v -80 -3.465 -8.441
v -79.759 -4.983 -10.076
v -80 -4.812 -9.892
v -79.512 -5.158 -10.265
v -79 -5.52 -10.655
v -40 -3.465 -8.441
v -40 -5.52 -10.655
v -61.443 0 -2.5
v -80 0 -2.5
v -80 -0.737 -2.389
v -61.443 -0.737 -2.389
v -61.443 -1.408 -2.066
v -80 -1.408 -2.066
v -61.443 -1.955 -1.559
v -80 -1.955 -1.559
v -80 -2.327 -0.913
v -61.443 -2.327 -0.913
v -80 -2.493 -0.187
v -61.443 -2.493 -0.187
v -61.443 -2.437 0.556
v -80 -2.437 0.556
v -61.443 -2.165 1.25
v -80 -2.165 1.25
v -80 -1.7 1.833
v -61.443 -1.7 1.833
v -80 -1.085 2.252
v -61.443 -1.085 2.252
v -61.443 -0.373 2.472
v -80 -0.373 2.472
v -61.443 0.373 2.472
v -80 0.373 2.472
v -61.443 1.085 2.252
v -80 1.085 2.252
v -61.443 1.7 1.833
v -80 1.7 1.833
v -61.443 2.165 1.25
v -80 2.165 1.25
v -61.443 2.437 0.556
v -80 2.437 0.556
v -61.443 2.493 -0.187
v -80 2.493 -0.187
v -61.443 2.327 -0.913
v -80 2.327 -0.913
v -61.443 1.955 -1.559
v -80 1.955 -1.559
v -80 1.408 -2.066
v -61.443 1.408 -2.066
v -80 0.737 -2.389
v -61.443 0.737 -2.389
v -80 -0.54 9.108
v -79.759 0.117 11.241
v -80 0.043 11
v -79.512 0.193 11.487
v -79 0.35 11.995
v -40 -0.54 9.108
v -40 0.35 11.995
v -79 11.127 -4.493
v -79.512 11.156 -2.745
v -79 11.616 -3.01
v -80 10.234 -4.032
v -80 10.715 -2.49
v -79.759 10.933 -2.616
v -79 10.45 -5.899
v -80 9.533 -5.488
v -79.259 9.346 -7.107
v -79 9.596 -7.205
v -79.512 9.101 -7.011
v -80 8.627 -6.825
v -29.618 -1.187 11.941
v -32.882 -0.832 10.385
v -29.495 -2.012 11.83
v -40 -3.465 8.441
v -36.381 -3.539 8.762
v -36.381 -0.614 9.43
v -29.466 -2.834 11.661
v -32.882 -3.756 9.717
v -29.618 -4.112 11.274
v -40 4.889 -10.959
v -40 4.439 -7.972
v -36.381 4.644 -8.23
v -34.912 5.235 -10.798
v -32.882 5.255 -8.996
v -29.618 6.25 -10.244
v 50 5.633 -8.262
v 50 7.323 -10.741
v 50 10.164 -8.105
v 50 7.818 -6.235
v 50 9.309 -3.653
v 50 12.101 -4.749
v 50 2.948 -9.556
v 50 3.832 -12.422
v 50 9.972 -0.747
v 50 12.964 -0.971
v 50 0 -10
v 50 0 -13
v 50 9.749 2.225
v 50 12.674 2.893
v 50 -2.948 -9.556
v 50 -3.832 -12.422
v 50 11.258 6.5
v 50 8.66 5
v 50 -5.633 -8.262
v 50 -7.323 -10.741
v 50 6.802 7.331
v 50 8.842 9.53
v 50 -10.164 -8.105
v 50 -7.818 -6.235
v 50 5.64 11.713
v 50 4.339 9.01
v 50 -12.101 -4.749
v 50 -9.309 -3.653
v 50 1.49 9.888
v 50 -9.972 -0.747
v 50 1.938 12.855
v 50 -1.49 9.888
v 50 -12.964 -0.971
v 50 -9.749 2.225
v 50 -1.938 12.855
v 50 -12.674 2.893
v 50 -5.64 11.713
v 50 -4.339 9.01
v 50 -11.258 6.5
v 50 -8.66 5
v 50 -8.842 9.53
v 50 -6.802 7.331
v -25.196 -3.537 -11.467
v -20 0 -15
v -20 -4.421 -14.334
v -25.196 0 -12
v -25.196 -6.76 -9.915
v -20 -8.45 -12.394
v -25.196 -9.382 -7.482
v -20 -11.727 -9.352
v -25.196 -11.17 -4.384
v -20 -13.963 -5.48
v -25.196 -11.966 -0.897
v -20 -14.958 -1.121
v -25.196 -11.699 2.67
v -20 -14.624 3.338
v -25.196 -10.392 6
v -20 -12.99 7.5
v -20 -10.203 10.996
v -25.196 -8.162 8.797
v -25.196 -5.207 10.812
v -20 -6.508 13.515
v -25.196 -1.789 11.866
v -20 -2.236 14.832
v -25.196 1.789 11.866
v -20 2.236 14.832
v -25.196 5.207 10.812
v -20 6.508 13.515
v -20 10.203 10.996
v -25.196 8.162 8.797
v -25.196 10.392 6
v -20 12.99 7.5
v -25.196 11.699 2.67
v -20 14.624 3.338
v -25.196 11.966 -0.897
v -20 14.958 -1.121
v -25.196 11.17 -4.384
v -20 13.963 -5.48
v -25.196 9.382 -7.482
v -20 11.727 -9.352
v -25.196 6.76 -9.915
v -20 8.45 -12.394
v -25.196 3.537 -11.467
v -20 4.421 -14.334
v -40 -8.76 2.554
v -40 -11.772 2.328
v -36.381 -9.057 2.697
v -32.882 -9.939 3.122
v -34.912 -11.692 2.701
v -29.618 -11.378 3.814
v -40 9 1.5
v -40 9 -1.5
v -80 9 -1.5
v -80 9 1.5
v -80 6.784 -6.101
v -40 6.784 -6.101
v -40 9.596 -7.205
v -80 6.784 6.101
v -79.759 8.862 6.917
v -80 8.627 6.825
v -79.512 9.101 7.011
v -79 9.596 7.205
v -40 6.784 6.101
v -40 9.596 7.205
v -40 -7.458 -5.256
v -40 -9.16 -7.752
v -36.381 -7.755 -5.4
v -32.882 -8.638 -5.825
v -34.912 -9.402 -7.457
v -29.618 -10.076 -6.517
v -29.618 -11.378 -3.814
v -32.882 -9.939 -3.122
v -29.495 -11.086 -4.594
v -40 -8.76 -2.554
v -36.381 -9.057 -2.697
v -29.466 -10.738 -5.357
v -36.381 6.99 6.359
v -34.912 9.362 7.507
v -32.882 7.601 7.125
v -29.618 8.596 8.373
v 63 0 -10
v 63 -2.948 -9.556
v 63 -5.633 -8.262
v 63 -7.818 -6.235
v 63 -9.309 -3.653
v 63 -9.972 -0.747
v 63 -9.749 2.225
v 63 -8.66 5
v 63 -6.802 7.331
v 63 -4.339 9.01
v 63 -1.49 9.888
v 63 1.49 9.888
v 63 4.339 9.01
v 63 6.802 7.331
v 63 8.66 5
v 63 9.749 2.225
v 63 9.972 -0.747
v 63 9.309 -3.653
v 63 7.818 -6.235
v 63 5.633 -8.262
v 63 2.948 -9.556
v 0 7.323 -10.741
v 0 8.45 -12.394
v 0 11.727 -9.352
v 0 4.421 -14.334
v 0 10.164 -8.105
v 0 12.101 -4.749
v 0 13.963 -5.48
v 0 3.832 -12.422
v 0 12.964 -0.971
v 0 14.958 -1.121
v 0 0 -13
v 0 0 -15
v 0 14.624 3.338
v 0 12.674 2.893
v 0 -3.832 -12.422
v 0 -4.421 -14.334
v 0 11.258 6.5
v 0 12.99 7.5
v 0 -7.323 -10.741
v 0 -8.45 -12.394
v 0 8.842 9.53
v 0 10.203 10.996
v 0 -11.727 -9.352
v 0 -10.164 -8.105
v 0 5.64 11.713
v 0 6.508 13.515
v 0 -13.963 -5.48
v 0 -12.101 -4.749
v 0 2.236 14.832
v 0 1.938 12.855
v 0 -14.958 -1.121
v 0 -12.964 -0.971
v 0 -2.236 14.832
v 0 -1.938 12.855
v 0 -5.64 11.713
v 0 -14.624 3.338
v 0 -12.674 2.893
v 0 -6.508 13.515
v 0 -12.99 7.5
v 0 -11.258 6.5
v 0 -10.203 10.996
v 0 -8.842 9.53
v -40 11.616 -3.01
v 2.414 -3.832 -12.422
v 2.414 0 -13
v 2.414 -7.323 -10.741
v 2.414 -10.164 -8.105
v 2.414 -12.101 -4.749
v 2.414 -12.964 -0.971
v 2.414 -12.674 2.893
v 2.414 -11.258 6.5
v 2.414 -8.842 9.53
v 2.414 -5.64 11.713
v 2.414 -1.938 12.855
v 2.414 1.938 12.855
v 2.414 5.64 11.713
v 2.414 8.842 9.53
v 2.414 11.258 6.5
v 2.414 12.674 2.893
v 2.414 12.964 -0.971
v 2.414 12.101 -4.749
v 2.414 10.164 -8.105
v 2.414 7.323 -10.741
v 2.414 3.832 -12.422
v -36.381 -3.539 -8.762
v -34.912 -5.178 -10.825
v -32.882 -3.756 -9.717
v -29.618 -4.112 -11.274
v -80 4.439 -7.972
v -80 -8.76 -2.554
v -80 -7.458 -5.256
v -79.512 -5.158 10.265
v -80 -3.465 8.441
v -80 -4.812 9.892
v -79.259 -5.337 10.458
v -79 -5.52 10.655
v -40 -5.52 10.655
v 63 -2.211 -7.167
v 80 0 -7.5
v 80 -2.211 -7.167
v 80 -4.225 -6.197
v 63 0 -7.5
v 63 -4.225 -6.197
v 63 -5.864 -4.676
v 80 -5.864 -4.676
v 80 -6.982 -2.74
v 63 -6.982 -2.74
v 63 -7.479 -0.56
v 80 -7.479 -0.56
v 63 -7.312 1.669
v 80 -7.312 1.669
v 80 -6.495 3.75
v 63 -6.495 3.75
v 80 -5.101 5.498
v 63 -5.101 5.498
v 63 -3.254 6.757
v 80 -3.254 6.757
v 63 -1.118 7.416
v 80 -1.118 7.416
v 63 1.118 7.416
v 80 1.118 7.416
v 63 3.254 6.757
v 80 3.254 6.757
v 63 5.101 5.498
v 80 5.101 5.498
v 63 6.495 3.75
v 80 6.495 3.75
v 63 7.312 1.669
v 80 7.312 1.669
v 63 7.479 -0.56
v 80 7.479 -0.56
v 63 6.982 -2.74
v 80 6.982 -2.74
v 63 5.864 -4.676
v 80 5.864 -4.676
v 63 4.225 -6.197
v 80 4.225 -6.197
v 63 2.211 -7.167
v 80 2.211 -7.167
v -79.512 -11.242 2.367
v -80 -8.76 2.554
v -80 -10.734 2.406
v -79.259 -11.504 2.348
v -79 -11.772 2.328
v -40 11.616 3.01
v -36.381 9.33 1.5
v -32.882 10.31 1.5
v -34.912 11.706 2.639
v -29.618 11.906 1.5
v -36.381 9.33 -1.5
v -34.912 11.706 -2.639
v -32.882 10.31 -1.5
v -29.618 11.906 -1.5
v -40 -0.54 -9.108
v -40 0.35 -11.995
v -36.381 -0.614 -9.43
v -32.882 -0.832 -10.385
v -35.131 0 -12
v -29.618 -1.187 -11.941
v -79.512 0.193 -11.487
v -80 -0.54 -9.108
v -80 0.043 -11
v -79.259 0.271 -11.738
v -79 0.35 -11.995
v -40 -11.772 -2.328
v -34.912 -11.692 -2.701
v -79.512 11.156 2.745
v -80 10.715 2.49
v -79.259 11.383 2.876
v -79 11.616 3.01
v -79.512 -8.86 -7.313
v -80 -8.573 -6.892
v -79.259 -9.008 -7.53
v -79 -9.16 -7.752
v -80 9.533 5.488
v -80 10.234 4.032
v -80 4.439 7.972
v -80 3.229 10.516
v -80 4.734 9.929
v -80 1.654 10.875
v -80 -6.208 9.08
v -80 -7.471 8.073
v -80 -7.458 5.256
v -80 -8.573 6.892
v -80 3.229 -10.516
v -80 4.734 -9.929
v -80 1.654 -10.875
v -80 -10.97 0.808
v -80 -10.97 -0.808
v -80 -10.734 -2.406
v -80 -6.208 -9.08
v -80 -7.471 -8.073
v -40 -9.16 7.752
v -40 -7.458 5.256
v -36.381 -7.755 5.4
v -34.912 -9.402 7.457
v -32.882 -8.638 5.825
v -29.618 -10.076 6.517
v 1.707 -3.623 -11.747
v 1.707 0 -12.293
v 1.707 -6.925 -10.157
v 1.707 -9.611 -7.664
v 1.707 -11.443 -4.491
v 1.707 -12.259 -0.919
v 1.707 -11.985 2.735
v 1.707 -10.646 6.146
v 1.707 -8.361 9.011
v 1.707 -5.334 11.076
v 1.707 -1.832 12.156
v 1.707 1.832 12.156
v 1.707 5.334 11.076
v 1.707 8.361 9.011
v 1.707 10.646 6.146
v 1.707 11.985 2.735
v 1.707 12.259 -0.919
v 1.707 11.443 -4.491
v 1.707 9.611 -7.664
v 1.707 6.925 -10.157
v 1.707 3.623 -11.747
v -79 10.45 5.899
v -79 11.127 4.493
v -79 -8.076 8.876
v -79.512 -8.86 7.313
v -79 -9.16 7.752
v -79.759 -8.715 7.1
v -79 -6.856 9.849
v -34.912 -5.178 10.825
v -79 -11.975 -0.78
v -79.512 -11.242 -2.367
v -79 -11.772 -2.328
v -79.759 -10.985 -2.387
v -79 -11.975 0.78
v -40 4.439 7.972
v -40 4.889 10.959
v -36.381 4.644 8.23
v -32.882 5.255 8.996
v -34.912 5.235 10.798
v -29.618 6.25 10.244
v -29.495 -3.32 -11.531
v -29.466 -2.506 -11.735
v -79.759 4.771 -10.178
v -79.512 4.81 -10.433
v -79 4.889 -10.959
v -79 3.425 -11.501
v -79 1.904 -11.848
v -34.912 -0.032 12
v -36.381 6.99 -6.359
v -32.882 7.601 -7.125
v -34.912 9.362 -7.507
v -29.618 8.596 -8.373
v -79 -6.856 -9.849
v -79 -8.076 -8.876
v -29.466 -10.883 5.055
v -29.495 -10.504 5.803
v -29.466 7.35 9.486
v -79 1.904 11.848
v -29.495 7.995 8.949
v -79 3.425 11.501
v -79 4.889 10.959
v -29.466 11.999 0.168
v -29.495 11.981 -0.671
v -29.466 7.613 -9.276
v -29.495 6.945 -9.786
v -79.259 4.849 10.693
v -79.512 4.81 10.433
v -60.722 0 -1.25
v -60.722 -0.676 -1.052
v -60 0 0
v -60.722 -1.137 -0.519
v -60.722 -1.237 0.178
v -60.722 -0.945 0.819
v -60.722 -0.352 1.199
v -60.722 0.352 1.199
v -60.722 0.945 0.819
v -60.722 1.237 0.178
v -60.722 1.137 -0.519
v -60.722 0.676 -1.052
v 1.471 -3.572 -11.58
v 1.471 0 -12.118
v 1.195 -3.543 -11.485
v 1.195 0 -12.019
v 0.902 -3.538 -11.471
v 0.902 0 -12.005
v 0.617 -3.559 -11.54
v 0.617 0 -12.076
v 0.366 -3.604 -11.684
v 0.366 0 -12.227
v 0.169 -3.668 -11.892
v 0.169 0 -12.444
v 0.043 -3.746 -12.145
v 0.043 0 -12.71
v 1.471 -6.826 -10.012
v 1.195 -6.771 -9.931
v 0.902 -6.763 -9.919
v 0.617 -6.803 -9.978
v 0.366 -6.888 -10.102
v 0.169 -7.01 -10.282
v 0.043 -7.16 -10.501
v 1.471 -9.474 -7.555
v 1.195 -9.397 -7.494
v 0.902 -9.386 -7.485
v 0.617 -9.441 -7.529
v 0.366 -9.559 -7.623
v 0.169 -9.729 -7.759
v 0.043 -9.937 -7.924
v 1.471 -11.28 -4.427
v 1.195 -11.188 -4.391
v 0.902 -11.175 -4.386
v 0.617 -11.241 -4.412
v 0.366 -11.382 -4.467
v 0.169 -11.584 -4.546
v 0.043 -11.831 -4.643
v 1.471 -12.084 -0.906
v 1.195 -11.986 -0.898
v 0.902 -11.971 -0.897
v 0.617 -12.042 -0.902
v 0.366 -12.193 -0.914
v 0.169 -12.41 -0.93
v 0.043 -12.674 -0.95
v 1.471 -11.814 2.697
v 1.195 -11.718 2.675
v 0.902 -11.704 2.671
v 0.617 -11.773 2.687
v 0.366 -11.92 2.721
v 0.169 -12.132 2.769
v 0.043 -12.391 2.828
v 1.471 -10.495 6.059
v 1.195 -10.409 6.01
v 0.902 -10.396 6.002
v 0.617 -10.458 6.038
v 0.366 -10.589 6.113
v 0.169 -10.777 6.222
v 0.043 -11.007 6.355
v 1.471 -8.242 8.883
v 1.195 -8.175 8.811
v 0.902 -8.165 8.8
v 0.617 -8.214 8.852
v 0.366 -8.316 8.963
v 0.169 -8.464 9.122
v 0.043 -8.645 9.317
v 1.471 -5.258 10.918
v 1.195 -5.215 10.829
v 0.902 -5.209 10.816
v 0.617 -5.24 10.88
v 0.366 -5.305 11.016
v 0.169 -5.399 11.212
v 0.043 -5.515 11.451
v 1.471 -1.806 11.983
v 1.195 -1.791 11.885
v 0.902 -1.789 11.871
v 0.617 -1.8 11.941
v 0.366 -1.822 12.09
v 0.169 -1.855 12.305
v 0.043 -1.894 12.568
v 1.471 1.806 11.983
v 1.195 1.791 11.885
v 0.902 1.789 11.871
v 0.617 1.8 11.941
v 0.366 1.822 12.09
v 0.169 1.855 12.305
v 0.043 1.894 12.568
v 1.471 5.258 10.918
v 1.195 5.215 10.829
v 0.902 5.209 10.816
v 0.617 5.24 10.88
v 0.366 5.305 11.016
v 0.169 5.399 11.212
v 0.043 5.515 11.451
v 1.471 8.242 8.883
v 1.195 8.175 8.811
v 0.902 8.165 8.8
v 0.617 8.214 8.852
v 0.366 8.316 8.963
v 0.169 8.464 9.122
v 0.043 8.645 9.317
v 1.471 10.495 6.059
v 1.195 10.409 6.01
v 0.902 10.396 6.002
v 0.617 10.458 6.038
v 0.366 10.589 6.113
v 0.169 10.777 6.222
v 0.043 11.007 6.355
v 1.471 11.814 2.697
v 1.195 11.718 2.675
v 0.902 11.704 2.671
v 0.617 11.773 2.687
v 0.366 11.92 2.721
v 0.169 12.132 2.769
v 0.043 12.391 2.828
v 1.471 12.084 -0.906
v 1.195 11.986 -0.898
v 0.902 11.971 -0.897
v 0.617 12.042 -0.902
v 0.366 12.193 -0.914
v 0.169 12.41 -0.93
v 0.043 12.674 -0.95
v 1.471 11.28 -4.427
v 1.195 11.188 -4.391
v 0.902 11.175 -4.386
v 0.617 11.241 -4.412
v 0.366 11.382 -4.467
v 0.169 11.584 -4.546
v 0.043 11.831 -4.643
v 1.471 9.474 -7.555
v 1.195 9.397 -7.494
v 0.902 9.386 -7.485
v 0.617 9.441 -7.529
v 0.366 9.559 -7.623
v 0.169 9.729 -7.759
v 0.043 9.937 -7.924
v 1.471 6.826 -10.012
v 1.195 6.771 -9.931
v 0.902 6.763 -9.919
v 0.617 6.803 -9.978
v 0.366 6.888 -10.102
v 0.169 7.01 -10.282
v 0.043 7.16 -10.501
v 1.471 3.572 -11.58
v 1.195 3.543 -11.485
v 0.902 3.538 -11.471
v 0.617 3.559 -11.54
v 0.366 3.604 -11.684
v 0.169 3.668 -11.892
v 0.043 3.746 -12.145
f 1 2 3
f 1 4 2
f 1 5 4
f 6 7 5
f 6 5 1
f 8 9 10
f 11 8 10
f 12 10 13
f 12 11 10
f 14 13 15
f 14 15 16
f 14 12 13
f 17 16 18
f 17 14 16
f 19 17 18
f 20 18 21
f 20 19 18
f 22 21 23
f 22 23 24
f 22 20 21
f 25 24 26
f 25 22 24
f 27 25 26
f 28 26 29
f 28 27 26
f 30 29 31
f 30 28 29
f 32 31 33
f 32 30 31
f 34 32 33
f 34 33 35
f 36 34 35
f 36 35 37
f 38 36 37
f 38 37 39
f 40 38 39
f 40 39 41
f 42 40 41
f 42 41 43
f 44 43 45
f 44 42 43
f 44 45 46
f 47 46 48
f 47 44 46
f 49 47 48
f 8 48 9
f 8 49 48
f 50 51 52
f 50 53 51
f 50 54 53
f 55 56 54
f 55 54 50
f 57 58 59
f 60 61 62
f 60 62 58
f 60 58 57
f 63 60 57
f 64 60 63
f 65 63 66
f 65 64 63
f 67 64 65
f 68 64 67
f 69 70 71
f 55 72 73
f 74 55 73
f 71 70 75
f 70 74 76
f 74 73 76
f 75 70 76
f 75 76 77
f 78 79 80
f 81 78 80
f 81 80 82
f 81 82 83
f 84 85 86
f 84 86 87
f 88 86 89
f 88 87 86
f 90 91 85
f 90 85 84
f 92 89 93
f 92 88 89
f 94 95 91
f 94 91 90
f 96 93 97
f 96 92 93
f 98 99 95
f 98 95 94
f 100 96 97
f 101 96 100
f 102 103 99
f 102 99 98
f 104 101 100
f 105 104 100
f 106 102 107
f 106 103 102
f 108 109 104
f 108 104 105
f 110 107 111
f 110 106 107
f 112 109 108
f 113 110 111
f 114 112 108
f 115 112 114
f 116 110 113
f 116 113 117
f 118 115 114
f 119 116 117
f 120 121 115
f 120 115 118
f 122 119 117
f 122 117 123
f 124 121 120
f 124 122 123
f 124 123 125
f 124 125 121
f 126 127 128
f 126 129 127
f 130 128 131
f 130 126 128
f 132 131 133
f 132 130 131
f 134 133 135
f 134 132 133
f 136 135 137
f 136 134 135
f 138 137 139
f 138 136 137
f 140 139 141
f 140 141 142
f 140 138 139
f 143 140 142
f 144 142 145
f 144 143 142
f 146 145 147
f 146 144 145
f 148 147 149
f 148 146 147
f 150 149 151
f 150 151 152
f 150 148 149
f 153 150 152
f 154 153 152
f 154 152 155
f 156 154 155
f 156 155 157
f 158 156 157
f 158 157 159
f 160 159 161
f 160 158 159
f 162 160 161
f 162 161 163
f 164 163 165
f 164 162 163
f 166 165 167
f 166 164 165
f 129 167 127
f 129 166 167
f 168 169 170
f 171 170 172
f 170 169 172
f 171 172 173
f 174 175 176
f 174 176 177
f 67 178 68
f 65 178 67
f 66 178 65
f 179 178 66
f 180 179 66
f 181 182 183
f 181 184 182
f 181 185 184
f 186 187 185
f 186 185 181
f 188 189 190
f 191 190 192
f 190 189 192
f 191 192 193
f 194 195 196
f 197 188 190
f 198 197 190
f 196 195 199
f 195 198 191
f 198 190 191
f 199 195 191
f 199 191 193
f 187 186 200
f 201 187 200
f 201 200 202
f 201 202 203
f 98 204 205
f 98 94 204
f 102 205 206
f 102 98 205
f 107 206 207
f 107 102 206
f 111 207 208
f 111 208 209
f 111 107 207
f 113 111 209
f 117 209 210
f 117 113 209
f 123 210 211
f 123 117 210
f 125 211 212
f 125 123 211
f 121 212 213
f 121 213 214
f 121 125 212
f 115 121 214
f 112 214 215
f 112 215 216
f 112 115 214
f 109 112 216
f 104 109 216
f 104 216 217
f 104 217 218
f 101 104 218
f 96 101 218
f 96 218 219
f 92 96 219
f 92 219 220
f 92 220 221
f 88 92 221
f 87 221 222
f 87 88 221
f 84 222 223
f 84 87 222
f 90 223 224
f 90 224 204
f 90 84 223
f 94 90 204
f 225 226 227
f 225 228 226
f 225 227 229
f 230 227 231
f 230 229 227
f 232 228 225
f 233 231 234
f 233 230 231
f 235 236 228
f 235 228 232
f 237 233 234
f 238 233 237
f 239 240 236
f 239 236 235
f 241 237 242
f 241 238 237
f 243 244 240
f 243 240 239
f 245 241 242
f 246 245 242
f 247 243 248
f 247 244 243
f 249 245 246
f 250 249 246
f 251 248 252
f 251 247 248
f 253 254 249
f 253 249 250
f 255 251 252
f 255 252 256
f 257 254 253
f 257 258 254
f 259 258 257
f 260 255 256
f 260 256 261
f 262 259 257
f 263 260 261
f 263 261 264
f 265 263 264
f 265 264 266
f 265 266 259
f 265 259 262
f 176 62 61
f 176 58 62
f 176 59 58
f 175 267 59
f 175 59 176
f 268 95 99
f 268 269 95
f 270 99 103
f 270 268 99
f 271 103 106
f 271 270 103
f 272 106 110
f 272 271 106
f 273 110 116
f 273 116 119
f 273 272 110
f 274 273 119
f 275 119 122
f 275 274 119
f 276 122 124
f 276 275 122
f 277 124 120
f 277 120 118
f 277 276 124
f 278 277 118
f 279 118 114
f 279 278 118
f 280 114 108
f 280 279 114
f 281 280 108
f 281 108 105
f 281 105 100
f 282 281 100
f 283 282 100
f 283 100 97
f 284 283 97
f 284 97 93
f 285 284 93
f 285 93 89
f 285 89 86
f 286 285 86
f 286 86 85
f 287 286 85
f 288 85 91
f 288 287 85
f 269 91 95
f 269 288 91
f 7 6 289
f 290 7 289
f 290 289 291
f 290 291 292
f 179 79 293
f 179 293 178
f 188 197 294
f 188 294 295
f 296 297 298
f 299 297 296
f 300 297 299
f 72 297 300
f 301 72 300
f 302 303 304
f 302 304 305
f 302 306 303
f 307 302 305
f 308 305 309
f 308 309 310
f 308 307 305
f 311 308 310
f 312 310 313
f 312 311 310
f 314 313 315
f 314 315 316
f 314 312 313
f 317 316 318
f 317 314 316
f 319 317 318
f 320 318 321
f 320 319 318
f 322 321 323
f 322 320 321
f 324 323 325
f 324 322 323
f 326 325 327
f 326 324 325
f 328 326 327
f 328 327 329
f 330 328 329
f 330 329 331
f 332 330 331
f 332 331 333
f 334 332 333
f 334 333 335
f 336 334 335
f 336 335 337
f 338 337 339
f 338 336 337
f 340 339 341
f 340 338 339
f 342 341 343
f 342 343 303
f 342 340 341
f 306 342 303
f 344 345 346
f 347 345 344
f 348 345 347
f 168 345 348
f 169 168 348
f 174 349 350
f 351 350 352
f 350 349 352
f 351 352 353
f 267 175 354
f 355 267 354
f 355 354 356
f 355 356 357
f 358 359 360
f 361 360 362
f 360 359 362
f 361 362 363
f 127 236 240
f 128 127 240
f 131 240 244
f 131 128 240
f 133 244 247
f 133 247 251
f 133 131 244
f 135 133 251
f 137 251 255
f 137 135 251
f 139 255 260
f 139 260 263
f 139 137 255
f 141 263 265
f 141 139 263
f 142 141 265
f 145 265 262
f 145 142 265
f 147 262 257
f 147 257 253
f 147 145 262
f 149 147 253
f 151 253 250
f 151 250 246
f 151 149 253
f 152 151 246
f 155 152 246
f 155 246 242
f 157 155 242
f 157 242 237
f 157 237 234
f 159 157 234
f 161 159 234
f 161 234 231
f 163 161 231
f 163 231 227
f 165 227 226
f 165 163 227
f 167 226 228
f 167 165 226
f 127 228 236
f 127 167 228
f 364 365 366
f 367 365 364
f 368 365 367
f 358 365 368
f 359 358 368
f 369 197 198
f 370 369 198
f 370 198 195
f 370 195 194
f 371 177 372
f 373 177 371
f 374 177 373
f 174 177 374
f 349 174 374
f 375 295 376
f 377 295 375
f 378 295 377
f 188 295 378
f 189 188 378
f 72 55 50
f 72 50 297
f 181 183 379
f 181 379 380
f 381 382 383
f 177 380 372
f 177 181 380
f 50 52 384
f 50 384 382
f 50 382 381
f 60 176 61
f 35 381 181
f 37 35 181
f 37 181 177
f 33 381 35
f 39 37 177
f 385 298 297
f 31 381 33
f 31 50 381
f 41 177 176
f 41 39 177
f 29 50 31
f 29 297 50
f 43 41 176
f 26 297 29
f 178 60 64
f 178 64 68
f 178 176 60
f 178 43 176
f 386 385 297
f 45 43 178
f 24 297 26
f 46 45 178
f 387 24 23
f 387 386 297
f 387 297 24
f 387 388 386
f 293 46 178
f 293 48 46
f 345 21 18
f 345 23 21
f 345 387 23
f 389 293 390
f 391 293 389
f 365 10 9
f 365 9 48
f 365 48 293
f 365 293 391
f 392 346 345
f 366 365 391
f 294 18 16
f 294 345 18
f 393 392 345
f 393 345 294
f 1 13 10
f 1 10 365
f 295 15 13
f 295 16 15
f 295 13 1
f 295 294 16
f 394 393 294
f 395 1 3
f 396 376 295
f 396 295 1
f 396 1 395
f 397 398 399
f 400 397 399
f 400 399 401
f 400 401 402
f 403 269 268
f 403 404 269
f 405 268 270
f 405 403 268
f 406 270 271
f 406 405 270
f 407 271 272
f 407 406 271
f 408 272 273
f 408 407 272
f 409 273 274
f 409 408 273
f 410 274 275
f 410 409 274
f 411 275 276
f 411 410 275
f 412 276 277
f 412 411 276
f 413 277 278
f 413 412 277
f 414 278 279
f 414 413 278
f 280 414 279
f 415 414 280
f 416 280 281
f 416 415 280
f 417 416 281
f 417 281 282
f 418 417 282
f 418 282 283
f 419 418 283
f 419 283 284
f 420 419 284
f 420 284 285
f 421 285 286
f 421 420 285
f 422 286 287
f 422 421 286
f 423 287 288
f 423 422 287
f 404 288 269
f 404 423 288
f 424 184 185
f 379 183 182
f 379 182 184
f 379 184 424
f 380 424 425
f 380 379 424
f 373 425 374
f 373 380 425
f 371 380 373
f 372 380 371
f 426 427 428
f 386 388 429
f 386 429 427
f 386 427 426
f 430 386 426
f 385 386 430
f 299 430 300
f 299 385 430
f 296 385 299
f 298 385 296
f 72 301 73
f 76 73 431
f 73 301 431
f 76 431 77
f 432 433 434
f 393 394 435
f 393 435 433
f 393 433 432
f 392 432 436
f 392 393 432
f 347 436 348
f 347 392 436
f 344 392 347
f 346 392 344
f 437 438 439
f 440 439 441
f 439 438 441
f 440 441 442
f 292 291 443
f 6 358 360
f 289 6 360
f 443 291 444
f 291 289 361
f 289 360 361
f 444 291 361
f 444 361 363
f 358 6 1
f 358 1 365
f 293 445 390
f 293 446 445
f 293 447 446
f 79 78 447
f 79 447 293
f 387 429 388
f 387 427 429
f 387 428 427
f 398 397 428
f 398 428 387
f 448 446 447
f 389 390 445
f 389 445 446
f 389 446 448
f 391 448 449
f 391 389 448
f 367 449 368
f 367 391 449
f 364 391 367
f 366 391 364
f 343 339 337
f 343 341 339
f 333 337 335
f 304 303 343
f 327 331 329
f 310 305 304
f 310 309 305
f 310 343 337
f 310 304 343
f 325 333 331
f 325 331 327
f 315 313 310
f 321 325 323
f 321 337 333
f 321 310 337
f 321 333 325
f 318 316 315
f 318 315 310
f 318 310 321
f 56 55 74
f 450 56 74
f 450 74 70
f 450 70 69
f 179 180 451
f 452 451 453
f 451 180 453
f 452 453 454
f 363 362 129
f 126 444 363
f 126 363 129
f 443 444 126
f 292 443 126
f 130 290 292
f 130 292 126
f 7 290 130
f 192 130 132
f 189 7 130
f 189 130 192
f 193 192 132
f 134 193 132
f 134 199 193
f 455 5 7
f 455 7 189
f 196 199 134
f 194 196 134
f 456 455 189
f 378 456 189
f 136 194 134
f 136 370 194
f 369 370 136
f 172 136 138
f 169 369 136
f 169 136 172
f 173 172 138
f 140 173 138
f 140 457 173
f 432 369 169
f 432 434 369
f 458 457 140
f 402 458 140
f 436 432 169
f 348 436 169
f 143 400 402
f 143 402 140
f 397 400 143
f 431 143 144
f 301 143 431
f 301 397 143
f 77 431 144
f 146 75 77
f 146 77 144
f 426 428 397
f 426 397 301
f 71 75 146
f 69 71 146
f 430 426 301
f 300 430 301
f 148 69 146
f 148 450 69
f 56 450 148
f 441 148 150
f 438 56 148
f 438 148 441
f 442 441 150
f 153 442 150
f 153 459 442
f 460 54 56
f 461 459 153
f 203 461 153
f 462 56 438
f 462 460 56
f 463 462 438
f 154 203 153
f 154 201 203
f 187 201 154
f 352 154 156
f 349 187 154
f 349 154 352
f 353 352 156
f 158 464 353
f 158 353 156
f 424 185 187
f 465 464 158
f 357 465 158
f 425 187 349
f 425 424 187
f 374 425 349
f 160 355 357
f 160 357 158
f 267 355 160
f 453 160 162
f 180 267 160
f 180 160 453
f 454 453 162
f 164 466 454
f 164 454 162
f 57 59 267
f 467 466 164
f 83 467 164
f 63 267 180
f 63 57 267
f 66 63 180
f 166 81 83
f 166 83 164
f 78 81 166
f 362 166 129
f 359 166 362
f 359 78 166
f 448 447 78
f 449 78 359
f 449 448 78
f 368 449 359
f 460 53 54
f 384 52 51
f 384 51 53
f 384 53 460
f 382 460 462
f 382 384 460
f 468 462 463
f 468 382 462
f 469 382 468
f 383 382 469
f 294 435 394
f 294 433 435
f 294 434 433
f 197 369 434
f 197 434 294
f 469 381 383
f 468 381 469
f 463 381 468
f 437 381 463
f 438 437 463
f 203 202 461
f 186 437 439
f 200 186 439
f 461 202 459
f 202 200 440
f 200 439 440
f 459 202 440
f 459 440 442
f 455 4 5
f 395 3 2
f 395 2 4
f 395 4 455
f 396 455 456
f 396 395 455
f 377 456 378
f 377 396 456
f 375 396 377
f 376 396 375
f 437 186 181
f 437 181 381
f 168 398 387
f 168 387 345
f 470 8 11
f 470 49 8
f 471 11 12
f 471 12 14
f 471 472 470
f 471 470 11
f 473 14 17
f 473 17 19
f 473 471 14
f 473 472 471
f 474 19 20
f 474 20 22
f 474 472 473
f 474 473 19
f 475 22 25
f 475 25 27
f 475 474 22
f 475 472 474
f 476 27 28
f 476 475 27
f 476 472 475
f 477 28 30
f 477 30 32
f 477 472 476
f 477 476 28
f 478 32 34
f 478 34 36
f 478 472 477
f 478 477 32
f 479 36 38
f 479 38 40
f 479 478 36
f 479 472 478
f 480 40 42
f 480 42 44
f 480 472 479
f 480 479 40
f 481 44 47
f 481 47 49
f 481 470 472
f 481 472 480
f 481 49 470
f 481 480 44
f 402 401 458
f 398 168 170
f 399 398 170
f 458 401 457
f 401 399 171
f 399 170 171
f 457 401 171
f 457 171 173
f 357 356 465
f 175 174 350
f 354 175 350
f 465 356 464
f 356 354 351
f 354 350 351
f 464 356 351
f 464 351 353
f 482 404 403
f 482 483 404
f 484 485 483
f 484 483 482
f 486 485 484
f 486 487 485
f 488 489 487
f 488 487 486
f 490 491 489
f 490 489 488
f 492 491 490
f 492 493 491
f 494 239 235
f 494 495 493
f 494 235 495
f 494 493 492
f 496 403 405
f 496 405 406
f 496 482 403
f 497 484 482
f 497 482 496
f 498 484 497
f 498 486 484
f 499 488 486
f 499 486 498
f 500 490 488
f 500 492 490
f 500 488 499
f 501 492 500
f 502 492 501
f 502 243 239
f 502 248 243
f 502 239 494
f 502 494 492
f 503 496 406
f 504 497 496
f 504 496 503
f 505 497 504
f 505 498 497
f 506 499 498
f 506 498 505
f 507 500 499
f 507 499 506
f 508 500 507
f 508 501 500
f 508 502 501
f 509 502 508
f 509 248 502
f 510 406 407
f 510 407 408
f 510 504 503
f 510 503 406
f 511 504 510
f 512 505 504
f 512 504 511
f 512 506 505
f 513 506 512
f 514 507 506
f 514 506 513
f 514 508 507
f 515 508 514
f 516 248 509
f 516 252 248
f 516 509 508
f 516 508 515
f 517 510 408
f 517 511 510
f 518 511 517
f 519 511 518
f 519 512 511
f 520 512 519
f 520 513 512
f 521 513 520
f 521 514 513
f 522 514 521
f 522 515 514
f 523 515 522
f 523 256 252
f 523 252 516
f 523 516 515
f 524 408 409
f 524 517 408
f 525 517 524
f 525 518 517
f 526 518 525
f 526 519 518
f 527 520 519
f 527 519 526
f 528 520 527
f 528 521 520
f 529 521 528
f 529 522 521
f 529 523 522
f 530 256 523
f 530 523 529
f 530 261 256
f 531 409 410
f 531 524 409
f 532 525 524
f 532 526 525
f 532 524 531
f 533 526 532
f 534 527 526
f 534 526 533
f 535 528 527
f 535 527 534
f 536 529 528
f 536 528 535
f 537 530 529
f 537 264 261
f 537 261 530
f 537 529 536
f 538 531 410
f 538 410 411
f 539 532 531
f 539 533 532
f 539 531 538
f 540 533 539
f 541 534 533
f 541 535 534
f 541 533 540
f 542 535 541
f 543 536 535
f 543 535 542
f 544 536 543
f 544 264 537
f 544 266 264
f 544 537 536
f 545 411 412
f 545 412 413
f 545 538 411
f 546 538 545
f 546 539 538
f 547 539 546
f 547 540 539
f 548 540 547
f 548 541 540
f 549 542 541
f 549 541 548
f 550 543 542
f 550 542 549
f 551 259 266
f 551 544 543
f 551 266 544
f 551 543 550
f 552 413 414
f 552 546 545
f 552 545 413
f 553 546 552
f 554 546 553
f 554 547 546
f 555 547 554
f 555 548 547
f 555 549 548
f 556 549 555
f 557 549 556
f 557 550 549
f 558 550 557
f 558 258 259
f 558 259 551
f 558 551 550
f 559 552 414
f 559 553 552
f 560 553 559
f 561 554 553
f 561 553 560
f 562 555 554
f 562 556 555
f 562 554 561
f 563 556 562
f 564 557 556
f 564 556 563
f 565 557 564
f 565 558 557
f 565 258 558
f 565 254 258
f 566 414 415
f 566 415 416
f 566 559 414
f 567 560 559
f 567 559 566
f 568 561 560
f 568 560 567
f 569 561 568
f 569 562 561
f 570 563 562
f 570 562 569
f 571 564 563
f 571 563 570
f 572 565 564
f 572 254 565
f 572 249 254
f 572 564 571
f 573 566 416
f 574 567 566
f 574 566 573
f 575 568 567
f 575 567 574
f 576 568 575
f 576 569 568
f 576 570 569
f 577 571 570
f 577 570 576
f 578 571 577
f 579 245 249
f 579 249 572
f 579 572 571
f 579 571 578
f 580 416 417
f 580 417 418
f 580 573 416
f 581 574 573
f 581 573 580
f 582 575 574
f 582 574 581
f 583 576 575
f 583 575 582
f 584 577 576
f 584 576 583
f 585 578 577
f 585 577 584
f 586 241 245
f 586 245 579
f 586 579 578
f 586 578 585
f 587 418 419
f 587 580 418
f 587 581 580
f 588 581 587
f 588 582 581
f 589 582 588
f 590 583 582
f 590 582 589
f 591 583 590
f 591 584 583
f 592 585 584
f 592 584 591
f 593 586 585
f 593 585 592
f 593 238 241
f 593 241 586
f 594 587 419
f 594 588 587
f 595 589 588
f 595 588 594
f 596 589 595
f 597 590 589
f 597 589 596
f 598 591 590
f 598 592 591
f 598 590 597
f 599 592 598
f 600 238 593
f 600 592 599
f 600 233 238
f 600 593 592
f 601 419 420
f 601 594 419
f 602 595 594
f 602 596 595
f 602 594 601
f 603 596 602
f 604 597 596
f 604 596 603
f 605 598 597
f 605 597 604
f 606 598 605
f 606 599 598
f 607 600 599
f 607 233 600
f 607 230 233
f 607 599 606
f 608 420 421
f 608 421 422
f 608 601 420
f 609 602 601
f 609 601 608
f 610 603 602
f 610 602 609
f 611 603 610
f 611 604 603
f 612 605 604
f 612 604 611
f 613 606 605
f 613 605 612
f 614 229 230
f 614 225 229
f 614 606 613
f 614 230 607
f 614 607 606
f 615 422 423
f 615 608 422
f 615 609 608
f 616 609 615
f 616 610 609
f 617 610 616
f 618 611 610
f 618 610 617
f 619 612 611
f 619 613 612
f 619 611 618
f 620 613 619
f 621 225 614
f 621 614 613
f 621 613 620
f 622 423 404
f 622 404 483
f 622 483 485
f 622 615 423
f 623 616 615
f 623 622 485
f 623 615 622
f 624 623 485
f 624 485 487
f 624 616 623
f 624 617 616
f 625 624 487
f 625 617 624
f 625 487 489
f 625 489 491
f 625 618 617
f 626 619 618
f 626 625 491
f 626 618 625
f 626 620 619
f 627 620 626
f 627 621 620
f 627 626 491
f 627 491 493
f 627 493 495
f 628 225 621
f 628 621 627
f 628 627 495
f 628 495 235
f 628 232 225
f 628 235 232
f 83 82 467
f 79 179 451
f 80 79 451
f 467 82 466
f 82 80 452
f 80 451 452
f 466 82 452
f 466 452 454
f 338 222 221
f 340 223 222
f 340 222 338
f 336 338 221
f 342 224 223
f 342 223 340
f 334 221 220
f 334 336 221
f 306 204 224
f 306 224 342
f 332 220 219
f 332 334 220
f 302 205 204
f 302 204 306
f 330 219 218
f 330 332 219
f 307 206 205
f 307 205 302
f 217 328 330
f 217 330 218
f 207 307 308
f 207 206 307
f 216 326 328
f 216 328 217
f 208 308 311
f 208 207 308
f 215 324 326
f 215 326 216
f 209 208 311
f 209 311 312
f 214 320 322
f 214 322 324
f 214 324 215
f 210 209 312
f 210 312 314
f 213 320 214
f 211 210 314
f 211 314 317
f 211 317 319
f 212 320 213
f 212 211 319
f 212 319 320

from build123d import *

# Parameters (mm, degrees)
KRUHOV_POLE1_COUNT = 7


with BuildPart() as part:
    # Skica1 → Rotovat1 (revolve)
    with BuildSketch(Plane.XY, mode=Mode.PRIVATE) as rotovat1_sk:
        with BuildLine():
            Line((-80, 2.5), (-61.443375673, 2.5))
            Line((-61.443375673, 2.5), (-60, 0))
            Line((-60, 0), (80, 0))
            Line((80, 0), (80, 7.5))
            Line((80, 7.5), (63, 7.5))
            Line((63, 7.5), (63, 10))
            Line((63, 10), (50, 10))
            Line((50, 10), (50, 13))
            Line((50, 13), (2.414213562, 13))
            Line((2.414213562, 13), (1.707106781, 12.292893219))
            ThreePointArc((1.707106781, 12.292893219), (0.617316568, 12.076120467), (0, 13))
            Line((0, 13), (0, 15))
            Line((0, 15), (-20, 15))
            Line((-20, 15), (-25.196152423, 12))
            Line((-25.196152423, 12), (-79, 12))
            Line((-79, 12), (-80, 11))
            Line((-80, 11), (-80, 2.5))
        make_face()
    revolve(rotovat1_sk.sketch.rotate(Axis((89.49015633, 0, 0), (-1, 0, 0)), 90), axis=Axis((89.49015633, 0, 0), (-1, 0, 0)))  # turned: the seam where the file's is

    # Odebrat tažením po křivce1: sweep along a path in Skica2
    with BuildLine(Plane.XY) as odebrat_ta_en_m_po_k_ivce1_path:
        Line((-80, 9), (-40, 9))
        ThreePointArc((-40, 9), (-30.024182748, 11.665552499), (-22.707471957, 18.951692985))
    # Skica3 → Odebrat tažením po křivce1 (sweep, cut)
    with BuildSketch(Plane.ZY.offset(80)):
        Polygon((-4.16819533, 13.621449875), (-1.5, 9), (1.5, 9), (4.16819533, 13.621449875), align=None)
    odebrat_ta_en_m_po_k_ivce1 = sweep(path=odebrat_ta_en_m_po_k_ivce1_path.line, mode=Mode.SUBTRACT)

    # Kruhové pole1: Odebrat tažením po křivce1 ×7 about axis
    kruhov_pole1_axis = Axis((0, 0, 0), (1, 0, 0))
    for i in range(1, KRUHOV_POLE1_COUNT):
        add(odebrat_ta_en_m_po_k_ivce1.rotate(kruhov_pole1_axis, i * 360 / KRUHOV_POLE1_COUNT), mode=Mode.SUBTRACT)


solid = part.part
